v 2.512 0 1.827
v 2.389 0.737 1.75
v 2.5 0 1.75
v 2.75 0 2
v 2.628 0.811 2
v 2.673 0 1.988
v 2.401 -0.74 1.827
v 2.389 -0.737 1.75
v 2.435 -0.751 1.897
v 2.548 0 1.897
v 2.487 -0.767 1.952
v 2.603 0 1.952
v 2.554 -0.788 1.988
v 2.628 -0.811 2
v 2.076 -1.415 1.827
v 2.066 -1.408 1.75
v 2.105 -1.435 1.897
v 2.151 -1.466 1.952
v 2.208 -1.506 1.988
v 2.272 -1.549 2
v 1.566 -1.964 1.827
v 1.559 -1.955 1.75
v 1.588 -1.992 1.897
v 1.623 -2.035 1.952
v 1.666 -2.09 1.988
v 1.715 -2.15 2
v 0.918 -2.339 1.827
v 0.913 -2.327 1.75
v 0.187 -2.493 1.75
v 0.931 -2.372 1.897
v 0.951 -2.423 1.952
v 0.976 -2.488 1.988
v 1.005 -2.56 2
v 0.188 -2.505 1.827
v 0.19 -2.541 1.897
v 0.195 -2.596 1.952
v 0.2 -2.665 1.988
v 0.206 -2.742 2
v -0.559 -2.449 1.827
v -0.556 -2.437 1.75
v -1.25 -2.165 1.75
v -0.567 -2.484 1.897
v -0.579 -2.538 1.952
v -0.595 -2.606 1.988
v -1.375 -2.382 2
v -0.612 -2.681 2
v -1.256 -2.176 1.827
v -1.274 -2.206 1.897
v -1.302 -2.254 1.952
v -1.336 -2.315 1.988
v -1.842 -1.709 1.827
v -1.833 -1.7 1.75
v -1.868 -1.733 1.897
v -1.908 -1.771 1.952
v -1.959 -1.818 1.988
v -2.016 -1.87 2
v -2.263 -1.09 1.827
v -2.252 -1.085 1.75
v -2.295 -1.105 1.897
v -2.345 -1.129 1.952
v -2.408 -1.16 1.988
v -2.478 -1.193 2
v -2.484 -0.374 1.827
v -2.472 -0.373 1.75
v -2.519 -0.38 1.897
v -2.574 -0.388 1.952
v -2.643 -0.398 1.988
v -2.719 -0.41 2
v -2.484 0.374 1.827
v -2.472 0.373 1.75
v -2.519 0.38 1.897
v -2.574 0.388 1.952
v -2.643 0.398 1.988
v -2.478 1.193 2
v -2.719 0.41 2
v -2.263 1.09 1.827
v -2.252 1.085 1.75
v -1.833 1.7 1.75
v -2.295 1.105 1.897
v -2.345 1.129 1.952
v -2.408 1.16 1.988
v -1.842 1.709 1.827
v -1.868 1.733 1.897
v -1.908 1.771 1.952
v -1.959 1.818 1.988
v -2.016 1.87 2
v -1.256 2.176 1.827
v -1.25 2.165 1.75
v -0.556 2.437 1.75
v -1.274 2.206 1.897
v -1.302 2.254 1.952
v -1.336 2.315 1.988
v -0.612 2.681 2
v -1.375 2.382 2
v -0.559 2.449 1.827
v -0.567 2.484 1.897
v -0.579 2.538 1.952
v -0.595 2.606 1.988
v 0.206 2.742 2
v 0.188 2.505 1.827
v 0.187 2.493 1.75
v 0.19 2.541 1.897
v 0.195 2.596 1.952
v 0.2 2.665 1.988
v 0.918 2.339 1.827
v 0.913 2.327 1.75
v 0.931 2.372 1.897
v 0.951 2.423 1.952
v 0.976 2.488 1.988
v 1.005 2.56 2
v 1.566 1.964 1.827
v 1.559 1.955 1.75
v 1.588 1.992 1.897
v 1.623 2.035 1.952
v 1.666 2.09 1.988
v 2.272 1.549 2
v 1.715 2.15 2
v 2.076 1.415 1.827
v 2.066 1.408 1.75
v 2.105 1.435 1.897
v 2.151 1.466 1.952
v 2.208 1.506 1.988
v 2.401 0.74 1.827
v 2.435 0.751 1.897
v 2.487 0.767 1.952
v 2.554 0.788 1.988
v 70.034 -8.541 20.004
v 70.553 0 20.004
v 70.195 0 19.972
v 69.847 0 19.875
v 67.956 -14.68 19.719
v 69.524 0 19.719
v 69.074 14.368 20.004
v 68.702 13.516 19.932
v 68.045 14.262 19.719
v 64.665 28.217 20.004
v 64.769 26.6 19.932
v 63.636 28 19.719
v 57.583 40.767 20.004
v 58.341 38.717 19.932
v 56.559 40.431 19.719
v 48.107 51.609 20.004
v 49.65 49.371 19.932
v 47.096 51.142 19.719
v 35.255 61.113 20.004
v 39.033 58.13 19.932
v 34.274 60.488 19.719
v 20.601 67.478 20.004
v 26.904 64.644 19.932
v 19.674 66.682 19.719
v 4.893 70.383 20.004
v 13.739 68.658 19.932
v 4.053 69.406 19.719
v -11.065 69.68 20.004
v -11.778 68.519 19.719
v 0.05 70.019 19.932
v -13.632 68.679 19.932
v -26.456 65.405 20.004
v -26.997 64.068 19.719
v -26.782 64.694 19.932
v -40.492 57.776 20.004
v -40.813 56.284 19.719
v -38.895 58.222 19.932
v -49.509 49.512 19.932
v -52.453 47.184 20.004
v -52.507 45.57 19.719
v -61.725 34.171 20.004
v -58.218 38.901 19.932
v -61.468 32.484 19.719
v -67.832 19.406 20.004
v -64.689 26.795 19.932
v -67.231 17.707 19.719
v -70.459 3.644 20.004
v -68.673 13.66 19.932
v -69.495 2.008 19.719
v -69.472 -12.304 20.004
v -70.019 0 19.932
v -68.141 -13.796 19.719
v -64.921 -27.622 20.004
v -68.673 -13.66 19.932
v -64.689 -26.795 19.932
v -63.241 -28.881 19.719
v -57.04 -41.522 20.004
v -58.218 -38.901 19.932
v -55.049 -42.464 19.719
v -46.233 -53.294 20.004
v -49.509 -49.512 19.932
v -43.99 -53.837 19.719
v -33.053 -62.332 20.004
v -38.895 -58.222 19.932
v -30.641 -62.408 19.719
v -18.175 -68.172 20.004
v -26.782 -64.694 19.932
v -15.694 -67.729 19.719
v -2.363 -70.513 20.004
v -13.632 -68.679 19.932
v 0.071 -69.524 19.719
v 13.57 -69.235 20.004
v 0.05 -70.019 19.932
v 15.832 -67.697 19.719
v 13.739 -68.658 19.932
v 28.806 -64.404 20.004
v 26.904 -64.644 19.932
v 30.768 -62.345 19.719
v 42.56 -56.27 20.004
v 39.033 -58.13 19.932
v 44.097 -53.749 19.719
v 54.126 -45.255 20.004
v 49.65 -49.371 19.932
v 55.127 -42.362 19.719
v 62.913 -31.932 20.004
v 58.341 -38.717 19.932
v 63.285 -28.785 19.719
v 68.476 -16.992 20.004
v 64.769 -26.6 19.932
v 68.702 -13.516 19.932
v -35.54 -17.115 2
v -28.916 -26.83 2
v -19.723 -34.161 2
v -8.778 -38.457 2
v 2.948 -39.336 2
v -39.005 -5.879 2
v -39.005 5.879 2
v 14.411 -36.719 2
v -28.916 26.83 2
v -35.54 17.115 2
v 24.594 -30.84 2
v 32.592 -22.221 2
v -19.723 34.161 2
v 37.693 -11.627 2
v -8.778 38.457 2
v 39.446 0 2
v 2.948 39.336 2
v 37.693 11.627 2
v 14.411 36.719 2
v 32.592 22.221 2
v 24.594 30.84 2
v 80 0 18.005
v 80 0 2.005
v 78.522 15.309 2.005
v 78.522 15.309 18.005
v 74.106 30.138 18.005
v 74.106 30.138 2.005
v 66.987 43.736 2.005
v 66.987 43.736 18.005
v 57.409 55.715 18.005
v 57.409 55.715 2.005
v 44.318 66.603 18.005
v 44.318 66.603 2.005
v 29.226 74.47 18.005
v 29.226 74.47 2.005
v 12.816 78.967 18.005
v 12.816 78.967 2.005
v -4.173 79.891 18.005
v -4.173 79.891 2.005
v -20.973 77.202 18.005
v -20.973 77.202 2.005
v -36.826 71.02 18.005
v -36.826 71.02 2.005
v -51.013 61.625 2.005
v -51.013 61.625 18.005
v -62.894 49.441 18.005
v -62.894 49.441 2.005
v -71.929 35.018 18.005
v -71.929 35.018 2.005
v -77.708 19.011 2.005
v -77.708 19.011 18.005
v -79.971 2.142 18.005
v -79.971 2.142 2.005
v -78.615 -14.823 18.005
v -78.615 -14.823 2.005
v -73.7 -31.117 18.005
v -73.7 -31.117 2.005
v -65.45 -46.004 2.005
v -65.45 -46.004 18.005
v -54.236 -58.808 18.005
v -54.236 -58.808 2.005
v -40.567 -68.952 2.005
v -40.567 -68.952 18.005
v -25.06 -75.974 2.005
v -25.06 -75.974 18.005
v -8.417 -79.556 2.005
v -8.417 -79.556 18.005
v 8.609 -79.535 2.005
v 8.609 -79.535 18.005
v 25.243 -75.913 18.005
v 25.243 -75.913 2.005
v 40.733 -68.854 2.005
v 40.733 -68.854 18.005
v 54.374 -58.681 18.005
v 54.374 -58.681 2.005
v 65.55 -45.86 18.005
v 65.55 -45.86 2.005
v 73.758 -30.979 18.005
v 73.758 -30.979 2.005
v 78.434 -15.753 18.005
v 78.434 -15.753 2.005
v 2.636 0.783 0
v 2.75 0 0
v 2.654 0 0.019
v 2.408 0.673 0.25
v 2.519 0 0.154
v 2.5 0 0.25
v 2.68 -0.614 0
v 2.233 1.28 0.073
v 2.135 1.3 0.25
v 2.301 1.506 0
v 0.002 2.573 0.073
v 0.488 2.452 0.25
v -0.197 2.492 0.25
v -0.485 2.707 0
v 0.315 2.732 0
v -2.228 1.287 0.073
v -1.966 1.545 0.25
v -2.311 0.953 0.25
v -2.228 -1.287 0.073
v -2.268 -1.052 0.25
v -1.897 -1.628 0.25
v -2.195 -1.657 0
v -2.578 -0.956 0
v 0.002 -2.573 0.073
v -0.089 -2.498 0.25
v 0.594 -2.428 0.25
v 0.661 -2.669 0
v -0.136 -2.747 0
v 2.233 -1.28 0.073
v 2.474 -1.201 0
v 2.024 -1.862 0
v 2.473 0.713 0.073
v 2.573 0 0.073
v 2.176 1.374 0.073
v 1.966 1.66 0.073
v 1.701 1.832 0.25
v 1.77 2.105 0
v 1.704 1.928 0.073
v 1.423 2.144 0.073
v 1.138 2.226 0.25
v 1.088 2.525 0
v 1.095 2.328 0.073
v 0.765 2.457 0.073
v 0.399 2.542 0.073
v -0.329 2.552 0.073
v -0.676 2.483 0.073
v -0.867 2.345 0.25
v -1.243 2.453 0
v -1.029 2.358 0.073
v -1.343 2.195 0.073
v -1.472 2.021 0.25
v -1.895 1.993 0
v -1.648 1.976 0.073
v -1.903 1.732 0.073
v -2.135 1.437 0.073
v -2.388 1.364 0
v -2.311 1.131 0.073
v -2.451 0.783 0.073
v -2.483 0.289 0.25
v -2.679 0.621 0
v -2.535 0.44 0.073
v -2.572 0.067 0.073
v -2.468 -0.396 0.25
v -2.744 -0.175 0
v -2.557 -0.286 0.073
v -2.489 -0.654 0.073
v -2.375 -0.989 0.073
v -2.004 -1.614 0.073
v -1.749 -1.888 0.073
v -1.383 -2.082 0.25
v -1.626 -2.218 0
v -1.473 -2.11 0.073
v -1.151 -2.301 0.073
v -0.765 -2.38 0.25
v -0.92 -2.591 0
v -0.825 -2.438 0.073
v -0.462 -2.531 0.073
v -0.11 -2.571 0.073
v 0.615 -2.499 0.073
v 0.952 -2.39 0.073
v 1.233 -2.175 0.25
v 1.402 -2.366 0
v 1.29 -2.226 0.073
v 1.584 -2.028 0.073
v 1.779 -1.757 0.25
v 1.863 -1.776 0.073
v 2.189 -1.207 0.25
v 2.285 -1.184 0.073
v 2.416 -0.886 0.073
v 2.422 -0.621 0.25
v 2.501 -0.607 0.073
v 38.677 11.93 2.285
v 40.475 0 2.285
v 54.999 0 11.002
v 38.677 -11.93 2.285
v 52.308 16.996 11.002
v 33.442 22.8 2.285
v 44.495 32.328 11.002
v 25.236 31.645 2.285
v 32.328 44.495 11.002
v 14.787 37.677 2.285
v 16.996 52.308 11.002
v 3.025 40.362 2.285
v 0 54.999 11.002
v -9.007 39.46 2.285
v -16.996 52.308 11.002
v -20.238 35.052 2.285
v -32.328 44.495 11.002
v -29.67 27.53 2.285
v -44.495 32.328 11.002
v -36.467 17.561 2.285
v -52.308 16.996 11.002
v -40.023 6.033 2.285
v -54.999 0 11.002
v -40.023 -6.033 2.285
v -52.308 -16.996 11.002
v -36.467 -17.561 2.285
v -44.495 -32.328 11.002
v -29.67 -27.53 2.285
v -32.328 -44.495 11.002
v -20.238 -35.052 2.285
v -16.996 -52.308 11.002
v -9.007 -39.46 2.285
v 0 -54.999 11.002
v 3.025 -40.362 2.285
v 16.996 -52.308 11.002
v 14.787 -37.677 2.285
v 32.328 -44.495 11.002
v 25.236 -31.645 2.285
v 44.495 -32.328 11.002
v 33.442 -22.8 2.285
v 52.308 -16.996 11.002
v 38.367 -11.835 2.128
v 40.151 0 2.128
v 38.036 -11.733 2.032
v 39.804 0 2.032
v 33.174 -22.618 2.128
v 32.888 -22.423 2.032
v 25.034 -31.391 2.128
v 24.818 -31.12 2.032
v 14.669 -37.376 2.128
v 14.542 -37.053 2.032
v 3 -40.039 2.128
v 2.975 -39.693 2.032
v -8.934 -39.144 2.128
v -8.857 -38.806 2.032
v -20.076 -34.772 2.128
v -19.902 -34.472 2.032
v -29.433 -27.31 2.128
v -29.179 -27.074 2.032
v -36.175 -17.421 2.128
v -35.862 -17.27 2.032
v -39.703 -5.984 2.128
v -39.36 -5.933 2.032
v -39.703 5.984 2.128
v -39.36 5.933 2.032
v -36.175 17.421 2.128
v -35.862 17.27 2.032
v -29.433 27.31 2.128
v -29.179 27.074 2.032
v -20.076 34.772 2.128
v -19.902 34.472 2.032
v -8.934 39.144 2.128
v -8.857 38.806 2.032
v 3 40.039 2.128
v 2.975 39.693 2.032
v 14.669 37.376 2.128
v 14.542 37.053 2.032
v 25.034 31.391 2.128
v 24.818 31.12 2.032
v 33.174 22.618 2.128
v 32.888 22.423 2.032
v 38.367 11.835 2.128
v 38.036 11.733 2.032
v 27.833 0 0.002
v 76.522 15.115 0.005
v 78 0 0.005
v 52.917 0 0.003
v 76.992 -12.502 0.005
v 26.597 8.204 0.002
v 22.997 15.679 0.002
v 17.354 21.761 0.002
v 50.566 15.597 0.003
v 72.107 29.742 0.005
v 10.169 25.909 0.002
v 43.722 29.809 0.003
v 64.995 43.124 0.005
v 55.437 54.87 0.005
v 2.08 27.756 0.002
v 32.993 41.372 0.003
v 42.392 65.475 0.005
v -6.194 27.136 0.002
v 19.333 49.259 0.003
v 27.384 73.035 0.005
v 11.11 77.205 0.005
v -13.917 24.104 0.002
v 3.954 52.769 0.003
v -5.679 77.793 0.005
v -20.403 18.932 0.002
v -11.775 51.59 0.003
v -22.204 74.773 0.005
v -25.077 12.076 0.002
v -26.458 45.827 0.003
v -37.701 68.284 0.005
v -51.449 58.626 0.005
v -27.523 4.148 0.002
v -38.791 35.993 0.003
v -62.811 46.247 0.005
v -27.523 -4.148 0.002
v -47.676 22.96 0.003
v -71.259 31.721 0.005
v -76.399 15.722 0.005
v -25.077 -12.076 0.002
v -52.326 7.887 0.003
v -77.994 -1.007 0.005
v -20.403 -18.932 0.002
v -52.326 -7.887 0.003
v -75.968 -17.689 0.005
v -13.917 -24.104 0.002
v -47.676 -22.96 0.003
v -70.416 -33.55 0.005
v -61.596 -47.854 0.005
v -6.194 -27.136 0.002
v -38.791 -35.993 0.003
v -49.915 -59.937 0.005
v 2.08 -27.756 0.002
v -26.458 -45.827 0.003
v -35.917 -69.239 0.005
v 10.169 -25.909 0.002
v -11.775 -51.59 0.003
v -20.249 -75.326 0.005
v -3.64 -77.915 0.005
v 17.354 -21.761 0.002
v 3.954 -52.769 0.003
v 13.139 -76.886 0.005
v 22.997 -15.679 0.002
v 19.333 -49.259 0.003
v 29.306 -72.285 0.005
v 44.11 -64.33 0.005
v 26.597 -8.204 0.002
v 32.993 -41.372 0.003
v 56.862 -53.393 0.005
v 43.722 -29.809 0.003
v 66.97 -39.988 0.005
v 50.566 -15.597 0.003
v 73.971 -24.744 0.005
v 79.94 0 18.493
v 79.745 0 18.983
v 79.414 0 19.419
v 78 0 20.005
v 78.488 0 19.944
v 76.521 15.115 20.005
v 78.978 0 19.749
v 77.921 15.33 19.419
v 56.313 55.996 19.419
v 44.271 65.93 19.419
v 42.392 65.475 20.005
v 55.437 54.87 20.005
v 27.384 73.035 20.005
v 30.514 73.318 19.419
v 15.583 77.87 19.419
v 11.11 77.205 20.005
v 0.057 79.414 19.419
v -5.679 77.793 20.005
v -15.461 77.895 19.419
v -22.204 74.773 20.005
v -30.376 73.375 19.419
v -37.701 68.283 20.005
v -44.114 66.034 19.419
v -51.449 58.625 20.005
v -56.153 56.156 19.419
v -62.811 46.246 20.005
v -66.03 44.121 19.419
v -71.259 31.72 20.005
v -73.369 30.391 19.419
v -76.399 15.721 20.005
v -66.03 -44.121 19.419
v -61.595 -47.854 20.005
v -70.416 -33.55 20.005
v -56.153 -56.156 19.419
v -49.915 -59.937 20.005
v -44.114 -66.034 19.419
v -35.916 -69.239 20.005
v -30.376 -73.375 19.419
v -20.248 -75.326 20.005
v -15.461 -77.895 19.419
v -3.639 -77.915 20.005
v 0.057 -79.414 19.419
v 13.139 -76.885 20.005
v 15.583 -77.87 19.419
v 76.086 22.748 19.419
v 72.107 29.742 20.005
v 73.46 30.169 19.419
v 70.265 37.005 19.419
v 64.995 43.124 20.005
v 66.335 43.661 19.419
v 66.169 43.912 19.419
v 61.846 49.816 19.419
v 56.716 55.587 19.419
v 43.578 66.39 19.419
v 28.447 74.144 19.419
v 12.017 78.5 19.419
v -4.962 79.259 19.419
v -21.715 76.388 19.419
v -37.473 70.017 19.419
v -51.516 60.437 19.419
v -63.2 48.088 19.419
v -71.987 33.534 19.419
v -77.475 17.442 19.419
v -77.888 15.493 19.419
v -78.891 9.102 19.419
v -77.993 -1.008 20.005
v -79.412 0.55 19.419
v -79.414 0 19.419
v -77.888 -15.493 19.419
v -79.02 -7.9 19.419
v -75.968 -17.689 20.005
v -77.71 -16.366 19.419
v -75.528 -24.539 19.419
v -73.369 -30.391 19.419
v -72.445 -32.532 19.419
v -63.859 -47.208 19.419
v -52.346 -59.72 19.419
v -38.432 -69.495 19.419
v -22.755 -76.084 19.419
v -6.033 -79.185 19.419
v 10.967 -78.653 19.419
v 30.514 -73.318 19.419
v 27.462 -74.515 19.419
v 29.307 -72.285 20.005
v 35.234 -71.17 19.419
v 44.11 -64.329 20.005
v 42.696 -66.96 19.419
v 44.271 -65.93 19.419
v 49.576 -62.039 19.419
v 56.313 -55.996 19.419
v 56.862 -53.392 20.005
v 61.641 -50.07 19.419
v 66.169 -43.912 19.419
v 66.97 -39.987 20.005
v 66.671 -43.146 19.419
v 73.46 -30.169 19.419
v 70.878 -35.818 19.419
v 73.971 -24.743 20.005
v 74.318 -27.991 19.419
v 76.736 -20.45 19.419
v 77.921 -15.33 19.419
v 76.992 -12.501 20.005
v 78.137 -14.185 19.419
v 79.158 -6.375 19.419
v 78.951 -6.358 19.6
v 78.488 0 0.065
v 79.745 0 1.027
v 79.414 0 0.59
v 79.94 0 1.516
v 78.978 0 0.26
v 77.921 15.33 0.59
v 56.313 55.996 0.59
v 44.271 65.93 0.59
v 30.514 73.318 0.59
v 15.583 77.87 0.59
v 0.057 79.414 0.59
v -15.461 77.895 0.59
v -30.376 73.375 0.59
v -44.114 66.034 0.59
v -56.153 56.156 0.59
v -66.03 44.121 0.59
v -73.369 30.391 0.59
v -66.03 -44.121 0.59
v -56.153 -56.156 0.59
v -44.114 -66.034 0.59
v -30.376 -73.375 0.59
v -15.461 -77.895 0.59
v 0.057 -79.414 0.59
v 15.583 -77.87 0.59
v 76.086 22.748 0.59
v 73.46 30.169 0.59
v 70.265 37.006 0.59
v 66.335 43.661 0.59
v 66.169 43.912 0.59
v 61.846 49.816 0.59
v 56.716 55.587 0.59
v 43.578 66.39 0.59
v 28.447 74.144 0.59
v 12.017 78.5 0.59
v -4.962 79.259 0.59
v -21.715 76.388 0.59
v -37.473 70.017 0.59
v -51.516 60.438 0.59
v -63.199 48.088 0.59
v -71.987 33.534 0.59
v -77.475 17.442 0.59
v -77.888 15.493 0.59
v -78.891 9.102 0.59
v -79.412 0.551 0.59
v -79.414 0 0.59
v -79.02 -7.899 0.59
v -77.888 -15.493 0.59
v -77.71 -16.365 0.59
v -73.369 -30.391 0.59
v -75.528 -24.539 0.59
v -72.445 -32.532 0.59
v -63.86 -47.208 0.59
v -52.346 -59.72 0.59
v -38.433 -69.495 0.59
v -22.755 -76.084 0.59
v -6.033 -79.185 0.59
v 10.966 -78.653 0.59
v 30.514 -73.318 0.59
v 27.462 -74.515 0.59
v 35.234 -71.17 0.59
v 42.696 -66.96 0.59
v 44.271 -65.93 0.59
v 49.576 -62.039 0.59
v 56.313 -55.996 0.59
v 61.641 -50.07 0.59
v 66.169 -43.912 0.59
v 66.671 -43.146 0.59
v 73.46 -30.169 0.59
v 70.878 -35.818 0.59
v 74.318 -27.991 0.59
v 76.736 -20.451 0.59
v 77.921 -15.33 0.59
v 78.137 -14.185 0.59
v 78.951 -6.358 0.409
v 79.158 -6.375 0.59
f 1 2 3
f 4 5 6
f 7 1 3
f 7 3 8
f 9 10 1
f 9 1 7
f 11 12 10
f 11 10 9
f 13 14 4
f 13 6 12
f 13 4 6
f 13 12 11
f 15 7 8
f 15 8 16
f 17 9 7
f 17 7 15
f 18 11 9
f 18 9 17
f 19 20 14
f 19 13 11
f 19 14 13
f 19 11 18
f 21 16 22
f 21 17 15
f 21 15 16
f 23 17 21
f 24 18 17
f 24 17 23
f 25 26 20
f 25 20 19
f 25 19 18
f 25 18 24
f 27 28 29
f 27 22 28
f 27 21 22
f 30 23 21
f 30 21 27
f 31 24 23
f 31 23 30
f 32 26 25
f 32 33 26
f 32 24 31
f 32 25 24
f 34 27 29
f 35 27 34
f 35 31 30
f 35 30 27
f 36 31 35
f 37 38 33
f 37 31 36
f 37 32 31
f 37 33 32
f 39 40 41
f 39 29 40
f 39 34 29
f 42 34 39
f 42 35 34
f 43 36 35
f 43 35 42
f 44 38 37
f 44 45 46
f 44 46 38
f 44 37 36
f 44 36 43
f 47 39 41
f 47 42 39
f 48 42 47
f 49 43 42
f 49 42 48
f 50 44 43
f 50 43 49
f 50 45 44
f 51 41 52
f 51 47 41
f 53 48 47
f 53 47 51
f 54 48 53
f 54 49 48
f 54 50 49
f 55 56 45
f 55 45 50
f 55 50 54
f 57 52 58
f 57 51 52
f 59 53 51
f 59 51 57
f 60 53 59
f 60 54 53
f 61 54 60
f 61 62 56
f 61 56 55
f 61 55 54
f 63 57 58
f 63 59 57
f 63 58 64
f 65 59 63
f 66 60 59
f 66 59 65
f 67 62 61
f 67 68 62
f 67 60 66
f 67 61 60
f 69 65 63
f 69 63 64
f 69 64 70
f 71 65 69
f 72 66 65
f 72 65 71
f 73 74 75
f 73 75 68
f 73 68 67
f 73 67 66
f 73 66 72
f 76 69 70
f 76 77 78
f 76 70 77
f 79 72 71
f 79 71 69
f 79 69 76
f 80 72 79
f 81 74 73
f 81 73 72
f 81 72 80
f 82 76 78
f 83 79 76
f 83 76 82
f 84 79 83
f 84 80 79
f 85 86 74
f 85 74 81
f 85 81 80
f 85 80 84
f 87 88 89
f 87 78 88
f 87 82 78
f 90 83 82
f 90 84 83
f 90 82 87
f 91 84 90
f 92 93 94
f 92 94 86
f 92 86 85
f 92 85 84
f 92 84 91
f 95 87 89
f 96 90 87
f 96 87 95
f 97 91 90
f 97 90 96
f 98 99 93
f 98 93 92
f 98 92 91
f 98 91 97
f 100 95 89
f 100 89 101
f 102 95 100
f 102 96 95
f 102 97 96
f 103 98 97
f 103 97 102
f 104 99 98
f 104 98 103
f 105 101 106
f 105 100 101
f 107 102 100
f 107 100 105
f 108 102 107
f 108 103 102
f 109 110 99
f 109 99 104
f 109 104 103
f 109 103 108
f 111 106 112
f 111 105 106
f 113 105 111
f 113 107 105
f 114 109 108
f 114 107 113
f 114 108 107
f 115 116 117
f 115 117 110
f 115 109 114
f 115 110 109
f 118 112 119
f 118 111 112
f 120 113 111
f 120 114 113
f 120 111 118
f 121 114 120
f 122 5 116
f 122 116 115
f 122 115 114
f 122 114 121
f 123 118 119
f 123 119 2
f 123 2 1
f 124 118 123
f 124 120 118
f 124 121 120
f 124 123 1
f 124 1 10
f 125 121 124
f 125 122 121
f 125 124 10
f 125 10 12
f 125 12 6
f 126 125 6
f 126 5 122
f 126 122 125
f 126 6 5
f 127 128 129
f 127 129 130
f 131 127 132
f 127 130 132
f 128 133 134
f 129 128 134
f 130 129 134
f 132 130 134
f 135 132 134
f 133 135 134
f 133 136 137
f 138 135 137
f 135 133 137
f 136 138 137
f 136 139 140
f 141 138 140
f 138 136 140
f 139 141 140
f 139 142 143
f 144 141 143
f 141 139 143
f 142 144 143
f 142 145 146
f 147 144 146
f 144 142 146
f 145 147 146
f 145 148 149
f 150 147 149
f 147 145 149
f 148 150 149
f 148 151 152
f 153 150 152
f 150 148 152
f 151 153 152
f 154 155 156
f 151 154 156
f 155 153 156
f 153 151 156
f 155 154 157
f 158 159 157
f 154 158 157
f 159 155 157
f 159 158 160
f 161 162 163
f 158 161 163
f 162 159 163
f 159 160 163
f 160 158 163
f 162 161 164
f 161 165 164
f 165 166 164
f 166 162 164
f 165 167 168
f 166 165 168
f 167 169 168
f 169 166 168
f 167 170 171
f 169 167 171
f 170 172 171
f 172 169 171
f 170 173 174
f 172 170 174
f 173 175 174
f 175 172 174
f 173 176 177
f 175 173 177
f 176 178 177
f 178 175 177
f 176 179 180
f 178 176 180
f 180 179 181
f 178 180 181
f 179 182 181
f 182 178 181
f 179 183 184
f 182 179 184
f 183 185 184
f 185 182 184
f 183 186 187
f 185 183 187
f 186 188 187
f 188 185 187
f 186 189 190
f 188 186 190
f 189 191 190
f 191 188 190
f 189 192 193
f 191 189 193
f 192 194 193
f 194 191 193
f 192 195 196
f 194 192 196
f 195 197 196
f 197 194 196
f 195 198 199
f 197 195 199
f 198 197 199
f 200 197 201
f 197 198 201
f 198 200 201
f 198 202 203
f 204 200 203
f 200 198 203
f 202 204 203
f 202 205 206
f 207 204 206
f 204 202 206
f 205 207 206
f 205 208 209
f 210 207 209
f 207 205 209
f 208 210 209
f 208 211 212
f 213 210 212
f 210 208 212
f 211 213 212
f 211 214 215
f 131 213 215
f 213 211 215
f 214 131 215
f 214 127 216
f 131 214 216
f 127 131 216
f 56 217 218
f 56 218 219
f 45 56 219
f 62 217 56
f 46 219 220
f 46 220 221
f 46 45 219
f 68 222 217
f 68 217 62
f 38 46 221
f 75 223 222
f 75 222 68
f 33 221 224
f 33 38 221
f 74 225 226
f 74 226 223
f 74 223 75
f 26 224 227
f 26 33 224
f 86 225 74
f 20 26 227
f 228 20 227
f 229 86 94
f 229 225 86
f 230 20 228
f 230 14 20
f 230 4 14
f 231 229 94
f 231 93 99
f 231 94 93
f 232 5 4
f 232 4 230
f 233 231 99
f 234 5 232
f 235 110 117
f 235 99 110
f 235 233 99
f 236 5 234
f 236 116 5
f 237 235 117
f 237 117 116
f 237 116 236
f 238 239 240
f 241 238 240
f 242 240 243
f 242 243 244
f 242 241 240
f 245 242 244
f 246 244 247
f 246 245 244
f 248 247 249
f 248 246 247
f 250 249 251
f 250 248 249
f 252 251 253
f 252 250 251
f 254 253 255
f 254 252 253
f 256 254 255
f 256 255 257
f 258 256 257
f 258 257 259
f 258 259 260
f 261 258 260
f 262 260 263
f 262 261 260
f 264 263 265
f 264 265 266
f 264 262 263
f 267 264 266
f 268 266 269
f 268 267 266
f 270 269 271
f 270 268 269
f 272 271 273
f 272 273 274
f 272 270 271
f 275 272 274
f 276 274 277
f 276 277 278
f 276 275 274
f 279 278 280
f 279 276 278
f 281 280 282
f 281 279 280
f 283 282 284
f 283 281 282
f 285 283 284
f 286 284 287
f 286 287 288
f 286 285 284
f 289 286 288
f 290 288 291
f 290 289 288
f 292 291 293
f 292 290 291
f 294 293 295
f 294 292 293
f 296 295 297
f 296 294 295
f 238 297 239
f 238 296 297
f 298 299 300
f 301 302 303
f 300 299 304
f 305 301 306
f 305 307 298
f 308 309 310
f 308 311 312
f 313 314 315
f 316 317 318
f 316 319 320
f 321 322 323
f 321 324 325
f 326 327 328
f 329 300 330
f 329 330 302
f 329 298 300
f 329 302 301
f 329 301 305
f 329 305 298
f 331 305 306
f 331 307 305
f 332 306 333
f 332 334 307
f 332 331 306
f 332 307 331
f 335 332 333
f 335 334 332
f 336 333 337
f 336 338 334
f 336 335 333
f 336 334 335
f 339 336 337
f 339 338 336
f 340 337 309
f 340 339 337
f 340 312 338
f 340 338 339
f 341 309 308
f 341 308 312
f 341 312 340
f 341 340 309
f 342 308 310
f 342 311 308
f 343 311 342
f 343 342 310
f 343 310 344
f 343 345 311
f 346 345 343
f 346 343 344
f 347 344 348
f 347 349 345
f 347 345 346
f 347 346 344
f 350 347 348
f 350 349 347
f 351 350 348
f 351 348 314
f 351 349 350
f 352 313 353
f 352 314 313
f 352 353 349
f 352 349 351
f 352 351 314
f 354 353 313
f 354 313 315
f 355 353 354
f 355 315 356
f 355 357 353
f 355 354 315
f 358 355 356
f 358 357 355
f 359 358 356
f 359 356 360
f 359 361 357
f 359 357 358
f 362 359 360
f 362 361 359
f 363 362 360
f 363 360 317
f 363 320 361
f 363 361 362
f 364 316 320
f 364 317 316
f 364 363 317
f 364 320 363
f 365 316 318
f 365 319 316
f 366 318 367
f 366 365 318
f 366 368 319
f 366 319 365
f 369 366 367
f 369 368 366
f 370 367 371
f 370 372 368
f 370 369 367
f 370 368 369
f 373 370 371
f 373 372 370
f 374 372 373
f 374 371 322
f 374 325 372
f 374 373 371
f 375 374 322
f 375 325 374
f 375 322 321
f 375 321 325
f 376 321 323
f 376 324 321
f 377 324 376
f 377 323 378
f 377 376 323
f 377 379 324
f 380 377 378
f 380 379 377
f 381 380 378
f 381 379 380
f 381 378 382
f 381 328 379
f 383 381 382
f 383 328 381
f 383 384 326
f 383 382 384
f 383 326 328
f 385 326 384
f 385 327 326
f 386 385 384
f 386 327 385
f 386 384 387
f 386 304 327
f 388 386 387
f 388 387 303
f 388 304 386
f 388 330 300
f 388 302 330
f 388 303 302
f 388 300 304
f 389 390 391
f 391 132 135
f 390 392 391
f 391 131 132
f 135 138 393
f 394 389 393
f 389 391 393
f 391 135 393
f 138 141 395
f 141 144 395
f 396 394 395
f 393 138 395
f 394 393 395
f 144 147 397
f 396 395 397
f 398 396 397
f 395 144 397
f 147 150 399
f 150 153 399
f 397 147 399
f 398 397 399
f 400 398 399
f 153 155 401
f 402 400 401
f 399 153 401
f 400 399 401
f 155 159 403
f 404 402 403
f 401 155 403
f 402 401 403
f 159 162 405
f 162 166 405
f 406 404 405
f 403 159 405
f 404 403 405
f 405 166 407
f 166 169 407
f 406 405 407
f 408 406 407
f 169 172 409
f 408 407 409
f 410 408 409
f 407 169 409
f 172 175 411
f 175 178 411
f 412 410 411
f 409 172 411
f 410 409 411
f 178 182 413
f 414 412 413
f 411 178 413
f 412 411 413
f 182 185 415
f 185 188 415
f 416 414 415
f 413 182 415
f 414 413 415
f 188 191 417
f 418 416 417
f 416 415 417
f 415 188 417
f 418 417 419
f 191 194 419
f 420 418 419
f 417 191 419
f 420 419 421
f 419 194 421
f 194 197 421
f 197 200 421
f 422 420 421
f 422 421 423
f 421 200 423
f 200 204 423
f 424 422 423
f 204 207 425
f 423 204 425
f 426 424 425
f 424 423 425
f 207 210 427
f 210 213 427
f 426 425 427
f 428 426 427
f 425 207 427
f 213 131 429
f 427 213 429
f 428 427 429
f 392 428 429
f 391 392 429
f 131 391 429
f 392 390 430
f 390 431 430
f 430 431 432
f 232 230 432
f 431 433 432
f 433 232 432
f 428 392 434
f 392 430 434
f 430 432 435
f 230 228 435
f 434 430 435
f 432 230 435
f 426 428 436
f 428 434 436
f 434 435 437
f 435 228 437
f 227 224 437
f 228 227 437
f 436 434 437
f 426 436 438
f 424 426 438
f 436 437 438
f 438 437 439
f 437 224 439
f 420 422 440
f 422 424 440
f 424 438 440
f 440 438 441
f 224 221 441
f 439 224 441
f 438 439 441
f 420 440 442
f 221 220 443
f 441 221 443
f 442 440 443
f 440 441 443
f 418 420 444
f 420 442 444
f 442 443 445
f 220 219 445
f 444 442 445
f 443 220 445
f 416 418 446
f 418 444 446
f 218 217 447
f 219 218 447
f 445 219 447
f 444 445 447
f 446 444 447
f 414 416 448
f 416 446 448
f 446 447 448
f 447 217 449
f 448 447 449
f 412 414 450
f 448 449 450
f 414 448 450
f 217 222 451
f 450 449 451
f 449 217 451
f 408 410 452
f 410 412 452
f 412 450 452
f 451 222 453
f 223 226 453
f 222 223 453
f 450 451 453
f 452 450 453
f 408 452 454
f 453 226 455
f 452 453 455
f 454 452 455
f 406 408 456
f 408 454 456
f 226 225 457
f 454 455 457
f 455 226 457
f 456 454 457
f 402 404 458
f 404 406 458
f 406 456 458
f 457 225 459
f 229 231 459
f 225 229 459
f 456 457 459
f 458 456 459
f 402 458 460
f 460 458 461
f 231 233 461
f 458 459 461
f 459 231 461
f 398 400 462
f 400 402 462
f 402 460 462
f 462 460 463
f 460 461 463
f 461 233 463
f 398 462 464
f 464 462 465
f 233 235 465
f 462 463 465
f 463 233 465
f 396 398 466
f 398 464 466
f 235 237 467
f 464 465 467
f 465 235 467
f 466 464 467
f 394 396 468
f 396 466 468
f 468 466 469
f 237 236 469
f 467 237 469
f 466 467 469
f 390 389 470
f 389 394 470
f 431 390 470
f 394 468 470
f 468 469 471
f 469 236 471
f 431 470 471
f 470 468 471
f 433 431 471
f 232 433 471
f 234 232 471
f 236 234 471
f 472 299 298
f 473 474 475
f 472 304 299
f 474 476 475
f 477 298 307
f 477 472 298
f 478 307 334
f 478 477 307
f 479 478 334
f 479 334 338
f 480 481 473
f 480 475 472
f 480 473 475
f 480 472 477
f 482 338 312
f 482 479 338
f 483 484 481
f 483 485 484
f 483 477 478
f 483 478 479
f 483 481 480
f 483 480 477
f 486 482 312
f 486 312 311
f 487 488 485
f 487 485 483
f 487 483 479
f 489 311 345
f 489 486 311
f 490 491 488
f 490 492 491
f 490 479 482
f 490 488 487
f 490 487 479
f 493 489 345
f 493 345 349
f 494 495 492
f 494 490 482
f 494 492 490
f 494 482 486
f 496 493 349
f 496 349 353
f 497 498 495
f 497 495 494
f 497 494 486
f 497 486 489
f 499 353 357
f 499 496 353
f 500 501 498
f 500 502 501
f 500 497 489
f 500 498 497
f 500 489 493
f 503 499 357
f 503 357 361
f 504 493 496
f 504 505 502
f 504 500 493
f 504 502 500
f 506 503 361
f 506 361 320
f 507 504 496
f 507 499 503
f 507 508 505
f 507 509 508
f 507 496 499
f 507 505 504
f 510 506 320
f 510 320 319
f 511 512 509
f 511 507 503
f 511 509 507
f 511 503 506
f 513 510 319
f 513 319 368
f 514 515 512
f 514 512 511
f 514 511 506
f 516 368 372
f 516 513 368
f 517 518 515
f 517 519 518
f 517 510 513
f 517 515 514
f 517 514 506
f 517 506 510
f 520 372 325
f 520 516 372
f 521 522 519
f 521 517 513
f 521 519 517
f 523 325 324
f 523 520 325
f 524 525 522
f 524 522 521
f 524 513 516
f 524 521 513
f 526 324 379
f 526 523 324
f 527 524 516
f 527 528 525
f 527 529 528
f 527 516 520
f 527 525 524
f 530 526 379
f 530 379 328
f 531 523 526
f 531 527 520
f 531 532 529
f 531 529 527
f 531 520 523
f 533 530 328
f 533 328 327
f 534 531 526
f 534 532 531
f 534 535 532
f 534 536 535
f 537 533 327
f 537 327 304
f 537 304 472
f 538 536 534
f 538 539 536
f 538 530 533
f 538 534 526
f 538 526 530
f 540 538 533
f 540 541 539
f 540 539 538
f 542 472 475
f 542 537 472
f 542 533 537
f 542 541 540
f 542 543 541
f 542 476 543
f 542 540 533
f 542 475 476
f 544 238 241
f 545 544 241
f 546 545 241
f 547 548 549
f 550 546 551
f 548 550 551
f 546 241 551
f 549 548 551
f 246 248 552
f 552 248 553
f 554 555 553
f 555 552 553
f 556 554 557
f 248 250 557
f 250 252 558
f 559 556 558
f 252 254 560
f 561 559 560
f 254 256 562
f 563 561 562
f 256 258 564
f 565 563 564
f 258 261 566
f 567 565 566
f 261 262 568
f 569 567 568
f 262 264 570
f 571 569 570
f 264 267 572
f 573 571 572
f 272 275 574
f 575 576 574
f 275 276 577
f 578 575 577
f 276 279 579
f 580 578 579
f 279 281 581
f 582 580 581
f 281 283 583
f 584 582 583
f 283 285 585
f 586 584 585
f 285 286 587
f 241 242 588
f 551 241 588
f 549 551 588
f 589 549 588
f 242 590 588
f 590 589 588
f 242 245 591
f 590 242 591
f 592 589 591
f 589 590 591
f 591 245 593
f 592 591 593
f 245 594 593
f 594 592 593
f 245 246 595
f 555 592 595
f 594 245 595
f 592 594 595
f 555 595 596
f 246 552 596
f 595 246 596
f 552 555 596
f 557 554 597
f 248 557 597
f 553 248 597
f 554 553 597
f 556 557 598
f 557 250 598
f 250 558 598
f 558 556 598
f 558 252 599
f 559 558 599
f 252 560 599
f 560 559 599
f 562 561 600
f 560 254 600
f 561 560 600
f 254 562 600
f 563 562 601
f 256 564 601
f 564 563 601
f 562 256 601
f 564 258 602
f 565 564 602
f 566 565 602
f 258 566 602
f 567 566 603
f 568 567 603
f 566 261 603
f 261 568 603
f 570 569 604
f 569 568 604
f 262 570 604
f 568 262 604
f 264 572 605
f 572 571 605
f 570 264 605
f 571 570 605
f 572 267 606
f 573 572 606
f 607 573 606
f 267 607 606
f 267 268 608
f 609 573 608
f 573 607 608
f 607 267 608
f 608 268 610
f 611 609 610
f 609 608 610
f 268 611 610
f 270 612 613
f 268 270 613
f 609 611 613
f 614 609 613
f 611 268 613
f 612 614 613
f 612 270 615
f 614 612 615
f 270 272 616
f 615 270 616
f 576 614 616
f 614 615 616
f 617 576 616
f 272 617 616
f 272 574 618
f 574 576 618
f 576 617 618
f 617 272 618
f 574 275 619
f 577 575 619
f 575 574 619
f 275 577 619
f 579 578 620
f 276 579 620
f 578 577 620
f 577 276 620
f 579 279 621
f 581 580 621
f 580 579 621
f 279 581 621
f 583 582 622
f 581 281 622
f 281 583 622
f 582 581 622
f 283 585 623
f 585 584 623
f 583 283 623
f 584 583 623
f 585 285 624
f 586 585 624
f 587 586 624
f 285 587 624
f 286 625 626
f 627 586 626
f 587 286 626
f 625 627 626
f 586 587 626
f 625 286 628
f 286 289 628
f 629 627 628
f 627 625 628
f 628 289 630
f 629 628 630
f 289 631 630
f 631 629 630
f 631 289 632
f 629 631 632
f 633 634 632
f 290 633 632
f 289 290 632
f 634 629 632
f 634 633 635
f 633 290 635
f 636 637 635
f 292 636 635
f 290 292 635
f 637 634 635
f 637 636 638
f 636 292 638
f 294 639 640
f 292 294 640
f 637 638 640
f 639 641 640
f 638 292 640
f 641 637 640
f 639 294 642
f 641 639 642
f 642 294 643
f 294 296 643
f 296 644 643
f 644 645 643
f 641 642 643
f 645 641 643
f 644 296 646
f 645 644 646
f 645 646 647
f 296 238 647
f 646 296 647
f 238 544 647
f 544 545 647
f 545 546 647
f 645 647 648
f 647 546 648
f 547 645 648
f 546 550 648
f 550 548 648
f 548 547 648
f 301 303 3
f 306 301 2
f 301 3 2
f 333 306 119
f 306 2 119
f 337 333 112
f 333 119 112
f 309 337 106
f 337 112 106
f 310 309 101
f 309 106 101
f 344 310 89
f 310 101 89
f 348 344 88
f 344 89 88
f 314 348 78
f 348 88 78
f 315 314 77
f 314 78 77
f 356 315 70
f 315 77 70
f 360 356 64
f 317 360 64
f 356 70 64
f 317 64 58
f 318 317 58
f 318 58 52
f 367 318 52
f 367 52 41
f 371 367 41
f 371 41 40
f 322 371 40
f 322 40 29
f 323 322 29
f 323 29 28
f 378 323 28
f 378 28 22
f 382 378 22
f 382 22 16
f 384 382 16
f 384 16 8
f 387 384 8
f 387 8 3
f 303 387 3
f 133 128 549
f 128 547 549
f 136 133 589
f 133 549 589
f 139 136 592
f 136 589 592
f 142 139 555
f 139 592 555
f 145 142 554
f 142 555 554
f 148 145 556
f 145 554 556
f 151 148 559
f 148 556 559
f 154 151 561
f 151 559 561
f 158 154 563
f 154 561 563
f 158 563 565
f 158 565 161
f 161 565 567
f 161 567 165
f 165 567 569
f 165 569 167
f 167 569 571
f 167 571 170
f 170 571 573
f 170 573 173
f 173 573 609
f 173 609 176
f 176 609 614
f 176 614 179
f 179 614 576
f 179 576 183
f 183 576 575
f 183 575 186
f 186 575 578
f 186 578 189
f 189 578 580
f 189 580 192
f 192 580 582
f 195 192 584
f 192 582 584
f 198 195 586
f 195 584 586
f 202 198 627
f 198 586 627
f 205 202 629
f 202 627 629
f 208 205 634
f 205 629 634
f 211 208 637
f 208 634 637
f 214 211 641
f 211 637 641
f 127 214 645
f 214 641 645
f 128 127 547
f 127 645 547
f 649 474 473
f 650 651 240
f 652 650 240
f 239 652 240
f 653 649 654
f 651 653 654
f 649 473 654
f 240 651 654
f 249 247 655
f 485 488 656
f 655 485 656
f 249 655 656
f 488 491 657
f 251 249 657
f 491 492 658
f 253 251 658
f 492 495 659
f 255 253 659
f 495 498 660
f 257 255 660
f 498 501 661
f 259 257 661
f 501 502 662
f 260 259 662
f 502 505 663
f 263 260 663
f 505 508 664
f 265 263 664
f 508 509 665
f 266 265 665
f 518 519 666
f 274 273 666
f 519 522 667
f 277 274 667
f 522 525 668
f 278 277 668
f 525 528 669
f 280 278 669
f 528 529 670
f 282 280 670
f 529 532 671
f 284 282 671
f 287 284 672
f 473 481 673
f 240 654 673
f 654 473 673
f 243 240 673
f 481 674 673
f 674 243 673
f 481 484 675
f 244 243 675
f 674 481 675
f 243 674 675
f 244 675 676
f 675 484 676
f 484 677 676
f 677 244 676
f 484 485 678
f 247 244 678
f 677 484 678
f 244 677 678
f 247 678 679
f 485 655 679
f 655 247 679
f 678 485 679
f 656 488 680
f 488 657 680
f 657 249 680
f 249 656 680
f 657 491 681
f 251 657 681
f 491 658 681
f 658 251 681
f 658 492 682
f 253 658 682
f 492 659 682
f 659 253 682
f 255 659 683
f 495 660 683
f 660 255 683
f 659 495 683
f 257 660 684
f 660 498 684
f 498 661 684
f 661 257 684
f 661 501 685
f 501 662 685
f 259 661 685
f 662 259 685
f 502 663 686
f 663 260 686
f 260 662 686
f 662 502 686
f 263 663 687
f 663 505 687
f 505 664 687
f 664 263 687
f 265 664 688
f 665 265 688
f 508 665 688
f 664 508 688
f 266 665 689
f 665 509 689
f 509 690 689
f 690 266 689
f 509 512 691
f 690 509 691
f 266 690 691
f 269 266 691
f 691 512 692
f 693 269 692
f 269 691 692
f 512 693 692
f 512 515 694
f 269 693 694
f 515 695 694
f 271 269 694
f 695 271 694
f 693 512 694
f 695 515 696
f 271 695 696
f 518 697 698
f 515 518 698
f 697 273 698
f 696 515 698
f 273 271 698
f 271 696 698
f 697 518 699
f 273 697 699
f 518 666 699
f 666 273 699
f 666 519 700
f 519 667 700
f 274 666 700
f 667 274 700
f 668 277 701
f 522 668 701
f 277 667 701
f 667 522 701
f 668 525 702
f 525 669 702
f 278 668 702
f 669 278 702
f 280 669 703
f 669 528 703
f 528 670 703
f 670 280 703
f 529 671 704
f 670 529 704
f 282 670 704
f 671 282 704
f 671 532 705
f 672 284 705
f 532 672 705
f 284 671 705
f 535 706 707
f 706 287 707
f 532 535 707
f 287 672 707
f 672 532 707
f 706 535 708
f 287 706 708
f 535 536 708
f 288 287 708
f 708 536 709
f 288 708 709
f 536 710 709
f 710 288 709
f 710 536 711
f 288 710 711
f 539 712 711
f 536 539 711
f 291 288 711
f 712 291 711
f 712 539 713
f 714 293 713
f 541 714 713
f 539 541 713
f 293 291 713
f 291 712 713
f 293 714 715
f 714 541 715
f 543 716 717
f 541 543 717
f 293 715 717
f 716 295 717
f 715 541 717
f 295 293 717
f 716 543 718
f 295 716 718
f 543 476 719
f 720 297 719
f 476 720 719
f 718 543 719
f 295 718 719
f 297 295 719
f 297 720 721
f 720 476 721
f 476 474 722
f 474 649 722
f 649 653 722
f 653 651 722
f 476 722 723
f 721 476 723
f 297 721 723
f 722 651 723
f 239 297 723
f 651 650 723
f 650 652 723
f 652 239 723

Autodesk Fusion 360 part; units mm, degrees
sketch "Sketch1" plane through (0, 0, 0) normal (0, 1, 0) x (1, 0, 0)
  line L0 (0, 0) -> (80, -0.0047)
  line L1 (0, 0) -> (0, -2)
  line L2 (0, -2) -> (40, -2)
  line L3 (80, -0.0047) -> (79.9988, -20.0047)
  line L4 (79.9988, -20.0047) -> (69.9988, -20.0041)
  line L5 (69.9988, -20.0041) -> (40, -2)
  line L6 (0, 0) -> (2.5, 0) construction
  line L7 (2.5, 0) -> (2.5, -2)
  dimension "d3" = 2
  dimension "d5" = 20
  dimension "d6" = 10
  dimension "d10" = 2.5
  dimension "d11" = 80
  dimension "d12" = 40
revolve "Revolve1" add sketch "Sketch1" angle 360 about axis through (0, 0, 1.75) along (0, 0, 1) contours L0 L2 L3 L4 L5 L7
fillet "Fillet1" radius 2 3 faces at (43.9825, -40.8098, 14.0027) (76.5702, -3.8215, 20.0045) (79.9006, -3.9877, 6.6713)
fillet "Fillet2" radius 0.25 2 edges at (-2.3308, -0.904, 0.0001) (-2.3308, -0.904, 2)
